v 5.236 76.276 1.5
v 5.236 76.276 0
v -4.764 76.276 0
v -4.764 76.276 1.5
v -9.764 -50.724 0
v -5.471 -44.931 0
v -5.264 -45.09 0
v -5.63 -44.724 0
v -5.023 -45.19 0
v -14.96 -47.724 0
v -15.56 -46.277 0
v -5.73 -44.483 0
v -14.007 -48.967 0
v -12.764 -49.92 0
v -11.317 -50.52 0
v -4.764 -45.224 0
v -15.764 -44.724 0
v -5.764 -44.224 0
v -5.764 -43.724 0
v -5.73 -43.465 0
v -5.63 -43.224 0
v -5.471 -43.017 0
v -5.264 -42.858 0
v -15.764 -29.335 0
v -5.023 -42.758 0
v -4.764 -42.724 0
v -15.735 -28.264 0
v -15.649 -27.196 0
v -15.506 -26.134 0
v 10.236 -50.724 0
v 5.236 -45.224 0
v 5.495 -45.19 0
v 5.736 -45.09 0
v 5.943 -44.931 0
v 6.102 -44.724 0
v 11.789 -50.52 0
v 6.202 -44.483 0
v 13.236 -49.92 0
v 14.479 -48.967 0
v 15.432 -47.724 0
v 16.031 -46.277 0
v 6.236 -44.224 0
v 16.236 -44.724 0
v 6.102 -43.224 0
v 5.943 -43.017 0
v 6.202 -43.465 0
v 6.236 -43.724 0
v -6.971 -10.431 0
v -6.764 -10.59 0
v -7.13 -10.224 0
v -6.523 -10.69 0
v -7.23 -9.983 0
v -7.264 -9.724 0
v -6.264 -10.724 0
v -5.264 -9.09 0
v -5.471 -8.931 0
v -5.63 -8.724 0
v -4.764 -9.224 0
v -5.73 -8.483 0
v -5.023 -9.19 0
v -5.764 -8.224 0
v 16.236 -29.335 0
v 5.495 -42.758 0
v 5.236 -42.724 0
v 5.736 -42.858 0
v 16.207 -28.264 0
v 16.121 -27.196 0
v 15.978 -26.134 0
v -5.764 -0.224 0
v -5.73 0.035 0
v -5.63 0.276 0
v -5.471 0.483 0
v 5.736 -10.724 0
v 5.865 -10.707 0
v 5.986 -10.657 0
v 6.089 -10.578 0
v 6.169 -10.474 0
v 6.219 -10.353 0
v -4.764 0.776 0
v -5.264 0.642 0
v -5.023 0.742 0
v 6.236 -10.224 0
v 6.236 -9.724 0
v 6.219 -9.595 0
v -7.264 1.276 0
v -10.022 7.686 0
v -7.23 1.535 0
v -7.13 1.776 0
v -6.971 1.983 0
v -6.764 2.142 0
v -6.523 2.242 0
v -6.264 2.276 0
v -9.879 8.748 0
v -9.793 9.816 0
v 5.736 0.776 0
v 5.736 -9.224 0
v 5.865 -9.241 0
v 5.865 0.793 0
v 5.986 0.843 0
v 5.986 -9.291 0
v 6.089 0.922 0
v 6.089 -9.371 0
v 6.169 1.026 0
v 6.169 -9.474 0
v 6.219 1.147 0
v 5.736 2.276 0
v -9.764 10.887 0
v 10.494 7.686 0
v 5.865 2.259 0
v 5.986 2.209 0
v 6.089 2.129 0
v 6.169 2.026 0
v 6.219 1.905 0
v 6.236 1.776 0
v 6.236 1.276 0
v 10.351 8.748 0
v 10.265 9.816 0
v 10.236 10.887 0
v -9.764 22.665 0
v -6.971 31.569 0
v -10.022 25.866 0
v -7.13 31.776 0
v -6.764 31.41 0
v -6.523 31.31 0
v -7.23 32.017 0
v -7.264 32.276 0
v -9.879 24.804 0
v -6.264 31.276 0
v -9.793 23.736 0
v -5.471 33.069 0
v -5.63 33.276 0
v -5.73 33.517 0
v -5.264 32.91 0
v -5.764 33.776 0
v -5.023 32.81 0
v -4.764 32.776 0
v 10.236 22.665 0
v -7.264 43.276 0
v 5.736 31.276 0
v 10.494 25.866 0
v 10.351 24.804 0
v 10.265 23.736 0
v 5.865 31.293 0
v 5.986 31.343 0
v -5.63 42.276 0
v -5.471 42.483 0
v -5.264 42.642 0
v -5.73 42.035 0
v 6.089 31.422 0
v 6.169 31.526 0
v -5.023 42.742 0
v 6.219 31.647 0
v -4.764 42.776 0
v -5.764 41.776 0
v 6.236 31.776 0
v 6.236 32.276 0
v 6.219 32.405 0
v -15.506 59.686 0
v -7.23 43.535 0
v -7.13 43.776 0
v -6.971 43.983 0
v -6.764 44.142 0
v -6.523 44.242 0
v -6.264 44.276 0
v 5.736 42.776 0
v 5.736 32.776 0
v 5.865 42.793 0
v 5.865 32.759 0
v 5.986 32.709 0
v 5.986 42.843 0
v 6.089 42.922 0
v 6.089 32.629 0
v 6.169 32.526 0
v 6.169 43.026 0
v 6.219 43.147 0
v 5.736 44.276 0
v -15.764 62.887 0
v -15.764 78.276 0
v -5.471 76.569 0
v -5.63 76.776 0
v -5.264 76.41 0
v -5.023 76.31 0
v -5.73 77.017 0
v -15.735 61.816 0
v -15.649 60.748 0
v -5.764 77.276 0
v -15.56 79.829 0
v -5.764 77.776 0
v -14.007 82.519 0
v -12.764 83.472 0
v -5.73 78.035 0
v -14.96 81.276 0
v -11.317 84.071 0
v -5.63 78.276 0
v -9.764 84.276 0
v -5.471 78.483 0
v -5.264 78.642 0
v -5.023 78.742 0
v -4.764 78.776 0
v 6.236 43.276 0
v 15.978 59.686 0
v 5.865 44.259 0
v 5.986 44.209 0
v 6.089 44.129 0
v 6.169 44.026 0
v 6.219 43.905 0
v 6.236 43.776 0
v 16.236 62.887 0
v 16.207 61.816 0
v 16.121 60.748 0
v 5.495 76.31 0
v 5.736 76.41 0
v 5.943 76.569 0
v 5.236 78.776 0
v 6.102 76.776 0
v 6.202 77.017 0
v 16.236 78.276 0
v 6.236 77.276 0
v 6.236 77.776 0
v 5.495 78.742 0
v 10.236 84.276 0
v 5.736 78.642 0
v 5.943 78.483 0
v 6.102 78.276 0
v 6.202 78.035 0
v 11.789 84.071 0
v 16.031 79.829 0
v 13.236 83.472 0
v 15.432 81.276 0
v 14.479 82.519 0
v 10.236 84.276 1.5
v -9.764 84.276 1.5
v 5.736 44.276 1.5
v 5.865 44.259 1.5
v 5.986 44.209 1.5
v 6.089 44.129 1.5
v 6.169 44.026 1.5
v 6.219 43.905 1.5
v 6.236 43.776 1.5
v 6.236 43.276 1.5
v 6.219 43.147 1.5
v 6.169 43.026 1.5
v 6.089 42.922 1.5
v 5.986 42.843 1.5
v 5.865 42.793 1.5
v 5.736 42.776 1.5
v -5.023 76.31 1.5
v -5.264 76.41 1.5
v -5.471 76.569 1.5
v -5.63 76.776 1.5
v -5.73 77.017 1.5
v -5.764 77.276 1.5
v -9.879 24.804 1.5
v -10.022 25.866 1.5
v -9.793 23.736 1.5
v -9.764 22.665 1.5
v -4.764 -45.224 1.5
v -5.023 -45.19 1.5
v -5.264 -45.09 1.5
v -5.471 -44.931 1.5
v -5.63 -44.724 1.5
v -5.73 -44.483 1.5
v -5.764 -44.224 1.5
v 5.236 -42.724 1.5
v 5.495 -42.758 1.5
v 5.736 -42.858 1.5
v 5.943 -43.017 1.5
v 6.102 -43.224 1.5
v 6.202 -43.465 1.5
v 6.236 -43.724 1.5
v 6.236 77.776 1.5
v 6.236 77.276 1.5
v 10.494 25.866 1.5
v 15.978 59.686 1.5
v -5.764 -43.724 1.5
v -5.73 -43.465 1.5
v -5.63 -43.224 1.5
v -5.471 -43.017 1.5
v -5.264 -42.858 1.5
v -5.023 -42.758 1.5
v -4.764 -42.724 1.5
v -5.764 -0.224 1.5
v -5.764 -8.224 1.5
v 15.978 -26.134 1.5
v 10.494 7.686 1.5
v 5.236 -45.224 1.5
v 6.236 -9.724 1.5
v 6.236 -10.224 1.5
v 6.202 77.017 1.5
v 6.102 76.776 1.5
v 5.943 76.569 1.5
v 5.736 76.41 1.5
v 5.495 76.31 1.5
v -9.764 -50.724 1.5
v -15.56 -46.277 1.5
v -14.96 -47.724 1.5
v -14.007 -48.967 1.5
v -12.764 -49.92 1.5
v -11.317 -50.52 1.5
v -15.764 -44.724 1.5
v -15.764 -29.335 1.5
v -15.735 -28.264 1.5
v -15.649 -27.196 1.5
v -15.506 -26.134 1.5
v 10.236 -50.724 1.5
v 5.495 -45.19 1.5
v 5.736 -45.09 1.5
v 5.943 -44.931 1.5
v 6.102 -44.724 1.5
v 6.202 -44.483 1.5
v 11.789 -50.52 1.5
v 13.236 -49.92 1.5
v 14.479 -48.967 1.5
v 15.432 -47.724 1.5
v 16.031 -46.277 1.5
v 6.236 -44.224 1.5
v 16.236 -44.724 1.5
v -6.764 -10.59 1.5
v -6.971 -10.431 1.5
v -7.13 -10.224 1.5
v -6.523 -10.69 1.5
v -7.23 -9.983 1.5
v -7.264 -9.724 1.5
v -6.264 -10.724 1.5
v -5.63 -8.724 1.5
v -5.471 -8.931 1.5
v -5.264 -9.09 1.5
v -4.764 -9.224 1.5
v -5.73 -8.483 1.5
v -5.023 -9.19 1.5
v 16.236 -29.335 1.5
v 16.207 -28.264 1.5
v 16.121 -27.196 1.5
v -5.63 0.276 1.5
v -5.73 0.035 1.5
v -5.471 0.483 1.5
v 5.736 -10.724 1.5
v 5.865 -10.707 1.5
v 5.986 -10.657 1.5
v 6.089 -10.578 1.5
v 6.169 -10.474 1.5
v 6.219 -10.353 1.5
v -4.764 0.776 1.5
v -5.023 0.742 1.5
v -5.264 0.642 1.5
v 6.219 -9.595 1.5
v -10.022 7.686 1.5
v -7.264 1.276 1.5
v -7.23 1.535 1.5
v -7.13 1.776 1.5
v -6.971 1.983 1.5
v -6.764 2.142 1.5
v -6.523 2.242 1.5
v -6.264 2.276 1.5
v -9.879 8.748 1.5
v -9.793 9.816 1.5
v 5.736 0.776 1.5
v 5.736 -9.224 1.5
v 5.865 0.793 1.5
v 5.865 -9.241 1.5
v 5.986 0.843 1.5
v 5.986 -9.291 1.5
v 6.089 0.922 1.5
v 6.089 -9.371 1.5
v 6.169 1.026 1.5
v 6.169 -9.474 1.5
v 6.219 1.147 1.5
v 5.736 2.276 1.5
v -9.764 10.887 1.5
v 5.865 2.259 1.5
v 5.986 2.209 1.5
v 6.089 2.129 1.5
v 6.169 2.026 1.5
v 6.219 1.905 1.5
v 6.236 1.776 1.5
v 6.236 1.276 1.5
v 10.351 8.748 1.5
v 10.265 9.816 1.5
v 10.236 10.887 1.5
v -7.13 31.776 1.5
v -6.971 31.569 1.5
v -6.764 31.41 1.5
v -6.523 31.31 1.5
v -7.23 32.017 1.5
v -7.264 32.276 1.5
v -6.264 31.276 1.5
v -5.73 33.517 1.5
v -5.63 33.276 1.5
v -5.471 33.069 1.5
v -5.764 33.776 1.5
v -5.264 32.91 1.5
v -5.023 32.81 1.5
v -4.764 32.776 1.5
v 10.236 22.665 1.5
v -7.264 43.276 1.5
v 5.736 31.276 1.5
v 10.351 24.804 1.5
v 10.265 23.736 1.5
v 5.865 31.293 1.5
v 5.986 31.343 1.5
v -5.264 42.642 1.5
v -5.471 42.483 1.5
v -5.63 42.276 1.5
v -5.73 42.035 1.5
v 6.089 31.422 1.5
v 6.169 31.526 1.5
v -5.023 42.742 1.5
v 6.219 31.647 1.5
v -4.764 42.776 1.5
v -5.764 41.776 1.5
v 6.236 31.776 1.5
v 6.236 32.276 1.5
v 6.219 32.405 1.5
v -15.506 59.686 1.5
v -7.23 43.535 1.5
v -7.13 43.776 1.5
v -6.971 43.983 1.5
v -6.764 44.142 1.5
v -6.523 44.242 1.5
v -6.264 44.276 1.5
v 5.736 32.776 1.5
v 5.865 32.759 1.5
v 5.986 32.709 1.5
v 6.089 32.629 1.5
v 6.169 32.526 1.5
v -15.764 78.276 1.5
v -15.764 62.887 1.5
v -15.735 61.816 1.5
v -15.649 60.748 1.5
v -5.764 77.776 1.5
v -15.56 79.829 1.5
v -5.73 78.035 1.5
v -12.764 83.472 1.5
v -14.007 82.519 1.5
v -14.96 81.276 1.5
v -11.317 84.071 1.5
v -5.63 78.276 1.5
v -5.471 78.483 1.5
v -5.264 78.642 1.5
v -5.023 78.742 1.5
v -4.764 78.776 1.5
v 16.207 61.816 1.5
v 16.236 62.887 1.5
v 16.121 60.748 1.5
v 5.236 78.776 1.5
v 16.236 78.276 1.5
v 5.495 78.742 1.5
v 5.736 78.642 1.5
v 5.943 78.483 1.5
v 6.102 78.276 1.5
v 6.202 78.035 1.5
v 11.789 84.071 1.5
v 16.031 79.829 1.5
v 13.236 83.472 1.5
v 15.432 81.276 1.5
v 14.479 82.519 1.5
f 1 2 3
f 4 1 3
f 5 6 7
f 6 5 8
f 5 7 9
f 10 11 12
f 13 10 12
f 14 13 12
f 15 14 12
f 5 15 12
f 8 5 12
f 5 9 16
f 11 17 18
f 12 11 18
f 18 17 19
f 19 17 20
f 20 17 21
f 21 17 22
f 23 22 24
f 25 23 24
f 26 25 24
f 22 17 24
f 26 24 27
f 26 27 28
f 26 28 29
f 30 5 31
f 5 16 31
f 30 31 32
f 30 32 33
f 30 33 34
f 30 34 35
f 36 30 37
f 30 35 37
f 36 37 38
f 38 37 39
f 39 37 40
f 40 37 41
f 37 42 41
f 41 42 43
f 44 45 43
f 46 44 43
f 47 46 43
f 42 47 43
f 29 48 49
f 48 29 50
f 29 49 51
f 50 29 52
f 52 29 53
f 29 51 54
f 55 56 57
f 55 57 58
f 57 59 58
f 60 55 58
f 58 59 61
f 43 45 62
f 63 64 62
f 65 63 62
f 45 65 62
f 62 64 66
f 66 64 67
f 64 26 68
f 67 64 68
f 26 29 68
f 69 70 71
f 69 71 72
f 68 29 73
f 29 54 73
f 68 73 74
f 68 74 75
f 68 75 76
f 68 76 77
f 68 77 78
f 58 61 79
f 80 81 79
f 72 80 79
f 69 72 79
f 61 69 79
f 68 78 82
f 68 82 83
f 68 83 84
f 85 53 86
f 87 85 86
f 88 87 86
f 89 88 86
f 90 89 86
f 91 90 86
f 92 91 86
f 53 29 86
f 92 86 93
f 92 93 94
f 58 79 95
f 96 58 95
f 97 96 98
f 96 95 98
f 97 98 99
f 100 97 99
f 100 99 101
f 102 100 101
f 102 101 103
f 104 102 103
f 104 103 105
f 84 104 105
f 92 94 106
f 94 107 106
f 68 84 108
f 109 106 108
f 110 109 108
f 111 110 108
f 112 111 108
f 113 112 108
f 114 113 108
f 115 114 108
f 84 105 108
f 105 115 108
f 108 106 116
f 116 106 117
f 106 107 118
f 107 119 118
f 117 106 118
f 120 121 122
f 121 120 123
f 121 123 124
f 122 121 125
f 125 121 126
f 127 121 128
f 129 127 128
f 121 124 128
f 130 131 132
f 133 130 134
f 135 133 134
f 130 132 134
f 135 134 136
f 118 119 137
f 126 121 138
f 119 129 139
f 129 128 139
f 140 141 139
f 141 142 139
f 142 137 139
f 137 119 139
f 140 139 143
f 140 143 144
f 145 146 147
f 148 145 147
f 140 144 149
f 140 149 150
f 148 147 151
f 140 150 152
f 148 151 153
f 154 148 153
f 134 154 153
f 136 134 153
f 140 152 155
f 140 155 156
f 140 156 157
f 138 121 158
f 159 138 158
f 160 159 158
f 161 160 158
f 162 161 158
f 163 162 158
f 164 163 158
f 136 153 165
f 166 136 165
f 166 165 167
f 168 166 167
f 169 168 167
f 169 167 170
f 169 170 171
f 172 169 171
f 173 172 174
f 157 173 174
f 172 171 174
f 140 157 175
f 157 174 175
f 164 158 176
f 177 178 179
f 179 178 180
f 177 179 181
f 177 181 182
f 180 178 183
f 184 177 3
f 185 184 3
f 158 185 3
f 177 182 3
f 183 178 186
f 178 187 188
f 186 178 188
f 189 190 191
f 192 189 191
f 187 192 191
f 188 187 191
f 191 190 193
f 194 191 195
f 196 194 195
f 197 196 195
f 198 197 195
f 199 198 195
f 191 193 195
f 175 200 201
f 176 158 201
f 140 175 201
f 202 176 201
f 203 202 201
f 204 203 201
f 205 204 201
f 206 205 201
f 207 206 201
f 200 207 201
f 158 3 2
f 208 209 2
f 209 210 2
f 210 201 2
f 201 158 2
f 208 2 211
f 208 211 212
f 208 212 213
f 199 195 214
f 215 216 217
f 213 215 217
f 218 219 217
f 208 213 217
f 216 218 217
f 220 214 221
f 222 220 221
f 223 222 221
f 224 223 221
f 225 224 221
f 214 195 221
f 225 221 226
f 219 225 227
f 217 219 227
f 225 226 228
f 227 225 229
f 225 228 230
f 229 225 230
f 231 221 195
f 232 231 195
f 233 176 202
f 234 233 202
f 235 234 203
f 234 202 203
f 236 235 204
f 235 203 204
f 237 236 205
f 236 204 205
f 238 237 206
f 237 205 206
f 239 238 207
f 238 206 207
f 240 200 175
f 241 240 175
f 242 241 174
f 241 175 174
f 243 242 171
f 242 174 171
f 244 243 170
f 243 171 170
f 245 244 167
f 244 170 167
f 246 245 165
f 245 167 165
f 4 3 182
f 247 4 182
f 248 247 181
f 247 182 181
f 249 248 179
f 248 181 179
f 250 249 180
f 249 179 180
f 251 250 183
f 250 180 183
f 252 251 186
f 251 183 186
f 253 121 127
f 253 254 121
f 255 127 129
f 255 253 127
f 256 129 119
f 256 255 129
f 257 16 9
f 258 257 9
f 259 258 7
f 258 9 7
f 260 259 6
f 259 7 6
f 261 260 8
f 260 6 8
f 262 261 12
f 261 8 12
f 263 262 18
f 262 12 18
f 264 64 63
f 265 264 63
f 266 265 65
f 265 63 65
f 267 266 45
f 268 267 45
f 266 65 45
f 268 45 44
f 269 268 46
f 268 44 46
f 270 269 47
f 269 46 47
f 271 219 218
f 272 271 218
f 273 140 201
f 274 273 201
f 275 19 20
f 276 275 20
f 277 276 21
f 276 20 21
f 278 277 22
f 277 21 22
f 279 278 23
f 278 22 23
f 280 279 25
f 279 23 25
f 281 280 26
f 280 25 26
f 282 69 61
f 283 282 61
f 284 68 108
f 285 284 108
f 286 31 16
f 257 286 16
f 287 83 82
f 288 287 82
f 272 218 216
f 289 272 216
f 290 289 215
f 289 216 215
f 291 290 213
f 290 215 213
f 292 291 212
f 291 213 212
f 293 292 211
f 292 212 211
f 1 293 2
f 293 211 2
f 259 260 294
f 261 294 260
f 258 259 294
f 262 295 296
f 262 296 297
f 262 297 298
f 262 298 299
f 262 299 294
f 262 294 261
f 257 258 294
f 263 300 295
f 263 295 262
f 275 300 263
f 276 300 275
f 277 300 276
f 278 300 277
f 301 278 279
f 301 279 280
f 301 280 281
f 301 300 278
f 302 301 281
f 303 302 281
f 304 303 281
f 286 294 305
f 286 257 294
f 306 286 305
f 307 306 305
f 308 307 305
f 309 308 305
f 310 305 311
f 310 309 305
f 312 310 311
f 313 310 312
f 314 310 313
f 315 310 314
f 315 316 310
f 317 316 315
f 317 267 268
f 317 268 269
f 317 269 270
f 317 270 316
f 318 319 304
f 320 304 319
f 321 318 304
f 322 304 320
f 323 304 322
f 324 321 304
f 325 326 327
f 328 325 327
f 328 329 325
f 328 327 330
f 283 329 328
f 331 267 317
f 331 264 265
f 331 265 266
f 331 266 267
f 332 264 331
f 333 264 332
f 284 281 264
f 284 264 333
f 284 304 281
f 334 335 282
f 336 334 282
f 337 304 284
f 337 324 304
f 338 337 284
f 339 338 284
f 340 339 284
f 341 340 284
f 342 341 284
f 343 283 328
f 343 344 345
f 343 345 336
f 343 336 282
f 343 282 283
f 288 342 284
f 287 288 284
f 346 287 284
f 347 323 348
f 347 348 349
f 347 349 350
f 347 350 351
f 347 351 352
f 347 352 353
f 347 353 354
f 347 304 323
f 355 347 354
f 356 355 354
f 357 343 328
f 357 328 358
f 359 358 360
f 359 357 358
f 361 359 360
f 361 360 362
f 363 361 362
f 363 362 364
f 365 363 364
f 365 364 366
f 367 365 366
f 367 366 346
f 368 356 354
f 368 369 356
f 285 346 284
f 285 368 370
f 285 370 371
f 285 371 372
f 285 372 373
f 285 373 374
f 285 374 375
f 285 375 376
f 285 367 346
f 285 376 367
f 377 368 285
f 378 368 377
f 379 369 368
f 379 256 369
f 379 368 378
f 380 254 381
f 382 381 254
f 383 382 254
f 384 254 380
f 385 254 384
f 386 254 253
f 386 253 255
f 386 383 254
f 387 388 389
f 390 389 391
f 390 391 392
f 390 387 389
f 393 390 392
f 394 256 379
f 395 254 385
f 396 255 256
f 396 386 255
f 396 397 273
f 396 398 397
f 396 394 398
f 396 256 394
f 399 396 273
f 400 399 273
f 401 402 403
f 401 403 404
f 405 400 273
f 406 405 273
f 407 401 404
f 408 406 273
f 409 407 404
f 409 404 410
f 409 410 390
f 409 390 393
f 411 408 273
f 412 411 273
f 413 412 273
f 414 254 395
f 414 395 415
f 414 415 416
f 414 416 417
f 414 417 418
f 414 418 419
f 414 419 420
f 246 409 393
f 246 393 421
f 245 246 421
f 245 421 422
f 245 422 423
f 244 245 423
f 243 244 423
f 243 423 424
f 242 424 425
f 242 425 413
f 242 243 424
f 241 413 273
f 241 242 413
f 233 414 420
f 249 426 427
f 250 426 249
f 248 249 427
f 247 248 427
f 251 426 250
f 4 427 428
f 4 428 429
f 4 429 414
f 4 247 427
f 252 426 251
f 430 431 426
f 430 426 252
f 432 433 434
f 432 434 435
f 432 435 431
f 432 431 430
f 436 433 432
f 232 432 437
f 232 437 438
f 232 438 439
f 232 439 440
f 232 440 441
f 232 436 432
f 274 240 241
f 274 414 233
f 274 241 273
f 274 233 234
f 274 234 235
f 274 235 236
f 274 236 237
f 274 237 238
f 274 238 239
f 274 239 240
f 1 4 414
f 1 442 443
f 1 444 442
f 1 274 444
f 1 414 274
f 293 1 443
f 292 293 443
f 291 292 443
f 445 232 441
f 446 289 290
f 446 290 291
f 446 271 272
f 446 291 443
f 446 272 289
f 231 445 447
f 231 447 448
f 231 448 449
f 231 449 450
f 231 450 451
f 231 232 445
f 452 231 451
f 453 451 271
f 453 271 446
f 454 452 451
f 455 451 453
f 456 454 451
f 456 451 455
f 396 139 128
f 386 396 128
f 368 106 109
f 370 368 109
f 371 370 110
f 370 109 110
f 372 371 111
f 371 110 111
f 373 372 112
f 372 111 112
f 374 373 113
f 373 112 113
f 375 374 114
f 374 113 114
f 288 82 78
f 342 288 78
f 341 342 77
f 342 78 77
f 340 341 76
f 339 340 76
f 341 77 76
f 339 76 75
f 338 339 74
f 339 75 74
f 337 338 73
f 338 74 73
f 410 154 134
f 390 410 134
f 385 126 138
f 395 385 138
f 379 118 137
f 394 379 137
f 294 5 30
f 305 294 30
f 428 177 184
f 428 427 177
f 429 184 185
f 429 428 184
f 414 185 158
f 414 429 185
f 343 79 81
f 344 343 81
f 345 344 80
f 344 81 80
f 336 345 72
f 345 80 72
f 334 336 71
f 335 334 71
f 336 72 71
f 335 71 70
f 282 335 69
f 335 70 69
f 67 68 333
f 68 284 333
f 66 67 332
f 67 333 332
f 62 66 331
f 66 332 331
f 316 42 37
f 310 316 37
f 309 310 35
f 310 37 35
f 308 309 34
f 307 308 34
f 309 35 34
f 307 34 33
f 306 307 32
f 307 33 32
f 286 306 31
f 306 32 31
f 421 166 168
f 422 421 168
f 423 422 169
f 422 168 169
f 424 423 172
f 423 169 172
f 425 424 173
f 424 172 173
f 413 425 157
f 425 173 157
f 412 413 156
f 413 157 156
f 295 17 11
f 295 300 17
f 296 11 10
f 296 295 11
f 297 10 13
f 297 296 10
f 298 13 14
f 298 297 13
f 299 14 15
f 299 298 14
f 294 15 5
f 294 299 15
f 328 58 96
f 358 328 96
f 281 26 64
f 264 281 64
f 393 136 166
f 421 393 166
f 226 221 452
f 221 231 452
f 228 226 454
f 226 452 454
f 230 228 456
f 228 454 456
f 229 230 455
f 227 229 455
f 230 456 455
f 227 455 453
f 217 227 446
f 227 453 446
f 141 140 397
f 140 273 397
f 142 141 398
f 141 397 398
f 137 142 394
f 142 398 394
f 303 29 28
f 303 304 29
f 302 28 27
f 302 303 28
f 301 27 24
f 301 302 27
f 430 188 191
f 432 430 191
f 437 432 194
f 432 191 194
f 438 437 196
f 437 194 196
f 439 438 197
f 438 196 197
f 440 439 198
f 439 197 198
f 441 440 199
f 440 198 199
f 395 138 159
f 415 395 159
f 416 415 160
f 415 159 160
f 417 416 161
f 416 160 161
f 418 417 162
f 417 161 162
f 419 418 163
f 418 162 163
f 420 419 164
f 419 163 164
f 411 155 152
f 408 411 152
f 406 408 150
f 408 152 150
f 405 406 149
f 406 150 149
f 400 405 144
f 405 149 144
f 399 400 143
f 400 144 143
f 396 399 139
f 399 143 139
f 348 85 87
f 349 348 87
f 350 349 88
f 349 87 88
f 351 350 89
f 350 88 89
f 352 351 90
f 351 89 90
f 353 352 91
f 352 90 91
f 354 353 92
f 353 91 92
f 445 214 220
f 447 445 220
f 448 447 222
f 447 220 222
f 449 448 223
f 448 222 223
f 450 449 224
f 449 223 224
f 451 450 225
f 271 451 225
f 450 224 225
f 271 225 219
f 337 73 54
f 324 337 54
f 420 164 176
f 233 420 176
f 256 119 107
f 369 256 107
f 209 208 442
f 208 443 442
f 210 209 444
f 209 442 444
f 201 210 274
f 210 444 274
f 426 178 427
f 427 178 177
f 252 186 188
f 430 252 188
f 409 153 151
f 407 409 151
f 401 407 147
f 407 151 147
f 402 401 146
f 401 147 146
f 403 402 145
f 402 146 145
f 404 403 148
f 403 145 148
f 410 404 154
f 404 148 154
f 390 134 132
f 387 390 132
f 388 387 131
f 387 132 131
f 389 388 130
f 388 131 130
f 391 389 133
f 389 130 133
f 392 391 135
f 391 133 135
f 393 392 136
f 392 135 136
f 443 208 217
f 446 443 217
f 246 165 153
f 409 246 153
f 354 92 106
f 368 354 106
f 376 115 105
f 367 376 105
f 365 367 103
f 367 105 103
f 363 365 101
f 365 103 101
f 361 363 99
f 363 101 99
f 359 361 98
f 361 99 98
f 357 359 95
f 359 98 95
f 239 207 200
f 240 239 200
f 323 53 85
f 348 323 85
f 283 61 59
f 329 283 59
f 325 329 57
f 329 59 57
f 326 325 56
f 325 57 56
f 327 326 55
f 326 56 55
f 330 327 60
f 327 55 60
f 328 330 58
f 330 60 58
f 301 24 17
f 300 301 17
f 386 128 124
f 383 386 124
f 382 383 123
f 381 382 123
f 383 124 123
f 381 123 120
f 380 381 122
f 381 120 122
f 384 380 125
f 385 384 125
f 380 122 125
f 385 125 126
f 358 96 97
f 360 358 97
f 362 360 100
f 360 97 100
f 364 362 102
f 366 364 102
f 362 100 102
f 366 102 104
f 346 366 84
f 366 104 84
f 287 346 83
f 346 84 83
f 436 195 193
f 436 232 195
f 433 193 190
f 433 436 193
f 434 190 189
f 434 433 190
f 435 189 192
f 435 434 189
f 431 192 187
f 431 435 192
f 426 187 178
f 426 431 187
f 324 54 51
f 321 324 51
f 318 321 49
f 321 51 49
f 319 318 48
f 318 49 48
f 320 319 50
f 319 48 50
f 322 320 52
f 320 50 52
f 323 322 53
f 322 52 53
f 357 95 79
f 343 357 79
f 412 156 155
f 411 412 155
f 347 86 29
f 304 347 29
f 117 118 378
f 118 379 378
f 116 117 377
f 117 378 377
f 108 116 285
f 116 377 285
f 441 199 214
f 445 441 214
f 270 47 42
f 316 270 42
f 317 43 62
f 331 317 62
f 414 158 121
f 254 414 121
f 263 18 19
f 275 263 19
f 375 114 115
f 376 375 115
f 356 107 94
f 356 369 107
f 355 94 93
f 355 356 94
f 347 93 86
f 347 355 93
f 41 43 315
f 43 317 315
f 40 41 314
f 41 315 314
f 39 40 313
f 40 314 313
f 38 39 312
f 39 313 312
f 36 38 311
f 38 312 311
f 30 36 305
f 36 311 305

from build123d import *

# Parameters (mm, degrees)
F1_DEPTH = 1.5
F2_R     = 6
F3_R     = 20


with BuildPart() as f1:
    # F0 (on Top) → F1 (new body)
    with BuildSketch(Plane.XY):
        Polygon((16.235917, 84.275943), (-15.764083, 84.275943), (-15.764083, 61.275943), (-9.764083, 24.275943), (-9.764083, 9.275943), (-15.764083, -27.724057), (-15.764083, -50.724057), (16.235917, -50.724057), (16.235917, -27.724057), (10.235917, 9.275943), (10.235917, 24.275943), (16.235917, 61.275943), align=None)
        with BuildLine():
            ThreePointArc((-5.764083, -43.724057), (-5.471189, -43.01695), (-4.764083, -42.724057))
            Line((-4.764083, -42.724057), (5.235917, -42.724057))
            ThreePointArc((5.235917, -42.724057), (5.943024, -43.01695), (6.235917, -43.724057))
            Line((6.235917, -43.724057), (6.235917, -44.224057))
            ThreePointArc((6.235917, -44.224057), (5.943024, -44.931164), (5.235917, -45.224057))
            Line((5.235917, -45.224057), (-4.764083, -45.224057))
            ThreePointArc((-4.764083, -45.224057), (-5.471189, -44.931164), (-5.764083, -44.224057))
            Line((-5.764083, -44.224057), (-5.764083, -43.724057))
        make_face(mode=Mode.SUBTRACT)
        with BuildLine():
            Line((5.735917, 0.775943), (-4.764083, 0.775943))
            ThreePointArc((-4.764083, 0.775943), (-5.471189, 0.48305), (-5.764083, -0.224057))
            Line((-5.764083, -0.224057), (-5.764083, -8.224057))
            ThreePointArc((-5.764083, -8.224057), (-5.471189, -8.931164), (-4.764083, -9.224057))
            Line((-4.764083, -9.224057), (5.735917, -9.224057))
            ThreePointArc((5.735917, -9.224057), (6.089471, -9.370504), (6.235917, -9.724057))
            Line((6.235917, -9.724057), (6.235917, -10.224057))
            ThreePointArc((6.235917, -10.224057), (6.089471, -10.57761), (5.735917, -10.724057))
            Line((5.735917, -10.724057), (-6.264083, -10.724057))
            ThreePointArc((-6.264083, -10.724057), (-6.971189, -10.431164), (-7.264083, -9.724057))
            Line((-7.264083, -9.724057), (-7.264083, 1.275943))
            ThreePointArc((-7.264083, 1.275943), (-6.971189, 1.98305), (-6.264083, 2.275943))
            Line((-6.264083, 2.275943), (5.735917, 2.275943))
            ThreePointArc((5.735917, 2.275943), (6.089471, 2.129496), (6.235917, 1.775943))
            Line((6.235917, 1.775943), (6.235917, 1.275943))
            ThreePointArc((6.235917, 1.275943), (6.089471, 0.92239), (5.735917, 0.775943))
        make_face(mode=Mode.SUBTRACT)
        with BuildLine():
            Line((5.735917, 42.775943), (-4.764083, 42.775943))
            ThreePointArc((-4.764083, 42.775943), (-5.471189, 42.48305), (-5.764083, 41.775943))
            Line((-5.764083, 41.775943), (-5.764083, 33.775943))
            ThreePointArc((-5.764083, 33.775943), (-5.471189, 33.068836), (-4.764083, 32.775943))
            Line((-4.764083, 32.775943), (5.735917, 32.775943))
            ThreePointArc((5.735917, 32.775943), (6.089471, 32.629496), (6.235917, 32.275943))
            Line((6.235917, 32.275943), (6.235917, 31.775943))
            ThreePointArc((6.235917, 31.775943), (6.089471, 31.42239), (5.735917, 31.275943))
            Line((5.735917, 31.275943), (-6.264083, 31.275943))
            ThreePointArc((-6.264083, 31.275943), (-6.971189, 31.568836), (-7.264083, 32.275943))
            Line((-7.264083, 32.275943), (-7.264083, 43.275943))
            ThreePointArc((-7.264083, 43.275943), (-6.971189, 43.98305), (-6.264083, 44.275943))
            Line((-6.264083, 44.275943), (5.735917, 44.275943))
            ThreePointArc((5.735917, 44.275943), (6.089471, 44.129496), (6.235917, 43.775943))
            Line((6.235917, 43.775943), (6.235917, 43.275943))
            ThreePointArc((6.235917, 43.275943), (6.089471, 42.92239), (5.735917, 42.775943))
        make_face(mode=Mode.SUBTRACT)
        with BuildLine():
            Line((5.235917, 76.275943), (-4.764083, 76.275943))
            ThreePointArc((-4.764083, 76.275943), (-5.471189, 76.568836), (-5.764083, 77.275943))
            Line((-5.764083, 77.275943), (-5.764083, 77.775943))
            ThreePointArc((-5.764083, 77.775943), (-5.471189, 78.48305), (-4.764083, 78.775943))
            Line((-4.764083, 78.775943), (5.235917, 78.775943))
            ThreePointArc((5.235917, 78.775943), (5.943024, 78.48305), (6.235917, 77.775943))
            Line((6.235917, 77.775943), (6.235917, 77.275943))
            ThreePointArc((6.235917, 77.275943), (5.943024, 76.568836), (5.235917, 76.275943))
        make_face(mode=Mode.SUBTRACT)
    extrude(amount=F1_DEPTH)

    # F2
    f2_edges = [f1.edges().sort_by_distance(p)[0] for p in [
        (16.235917, 84.275943, 0.75),
        (-15.764083, 84.275943, 0.75),
        (-15.764083, -50.724057, 0.75),
        (16.235917, -50.724057, 0.75),
    ]]
    fillet(f2_edges, radius=F2_R)

    # F3
    f3_edges = [f1.edges().sort_by_distance(p)[0] for p in [
        (16.235917, 61.275943, 0.75),
        (-15.764083, 61.275943, 0.75),
        (16.235917, -27.724057, 0.75),
        (-15.764083, -27.724057, 0.75),
        (-9.764083, 9.275943, 0.75),
        (10.235917, 9.275943, 0.75),
        (10.235917, 24.275943, 0.75),
        (-9.764083, 24.275943, 0.75),
    ]]
    fillet(f3_edges, radius=F3_R)


solid = f1.part
